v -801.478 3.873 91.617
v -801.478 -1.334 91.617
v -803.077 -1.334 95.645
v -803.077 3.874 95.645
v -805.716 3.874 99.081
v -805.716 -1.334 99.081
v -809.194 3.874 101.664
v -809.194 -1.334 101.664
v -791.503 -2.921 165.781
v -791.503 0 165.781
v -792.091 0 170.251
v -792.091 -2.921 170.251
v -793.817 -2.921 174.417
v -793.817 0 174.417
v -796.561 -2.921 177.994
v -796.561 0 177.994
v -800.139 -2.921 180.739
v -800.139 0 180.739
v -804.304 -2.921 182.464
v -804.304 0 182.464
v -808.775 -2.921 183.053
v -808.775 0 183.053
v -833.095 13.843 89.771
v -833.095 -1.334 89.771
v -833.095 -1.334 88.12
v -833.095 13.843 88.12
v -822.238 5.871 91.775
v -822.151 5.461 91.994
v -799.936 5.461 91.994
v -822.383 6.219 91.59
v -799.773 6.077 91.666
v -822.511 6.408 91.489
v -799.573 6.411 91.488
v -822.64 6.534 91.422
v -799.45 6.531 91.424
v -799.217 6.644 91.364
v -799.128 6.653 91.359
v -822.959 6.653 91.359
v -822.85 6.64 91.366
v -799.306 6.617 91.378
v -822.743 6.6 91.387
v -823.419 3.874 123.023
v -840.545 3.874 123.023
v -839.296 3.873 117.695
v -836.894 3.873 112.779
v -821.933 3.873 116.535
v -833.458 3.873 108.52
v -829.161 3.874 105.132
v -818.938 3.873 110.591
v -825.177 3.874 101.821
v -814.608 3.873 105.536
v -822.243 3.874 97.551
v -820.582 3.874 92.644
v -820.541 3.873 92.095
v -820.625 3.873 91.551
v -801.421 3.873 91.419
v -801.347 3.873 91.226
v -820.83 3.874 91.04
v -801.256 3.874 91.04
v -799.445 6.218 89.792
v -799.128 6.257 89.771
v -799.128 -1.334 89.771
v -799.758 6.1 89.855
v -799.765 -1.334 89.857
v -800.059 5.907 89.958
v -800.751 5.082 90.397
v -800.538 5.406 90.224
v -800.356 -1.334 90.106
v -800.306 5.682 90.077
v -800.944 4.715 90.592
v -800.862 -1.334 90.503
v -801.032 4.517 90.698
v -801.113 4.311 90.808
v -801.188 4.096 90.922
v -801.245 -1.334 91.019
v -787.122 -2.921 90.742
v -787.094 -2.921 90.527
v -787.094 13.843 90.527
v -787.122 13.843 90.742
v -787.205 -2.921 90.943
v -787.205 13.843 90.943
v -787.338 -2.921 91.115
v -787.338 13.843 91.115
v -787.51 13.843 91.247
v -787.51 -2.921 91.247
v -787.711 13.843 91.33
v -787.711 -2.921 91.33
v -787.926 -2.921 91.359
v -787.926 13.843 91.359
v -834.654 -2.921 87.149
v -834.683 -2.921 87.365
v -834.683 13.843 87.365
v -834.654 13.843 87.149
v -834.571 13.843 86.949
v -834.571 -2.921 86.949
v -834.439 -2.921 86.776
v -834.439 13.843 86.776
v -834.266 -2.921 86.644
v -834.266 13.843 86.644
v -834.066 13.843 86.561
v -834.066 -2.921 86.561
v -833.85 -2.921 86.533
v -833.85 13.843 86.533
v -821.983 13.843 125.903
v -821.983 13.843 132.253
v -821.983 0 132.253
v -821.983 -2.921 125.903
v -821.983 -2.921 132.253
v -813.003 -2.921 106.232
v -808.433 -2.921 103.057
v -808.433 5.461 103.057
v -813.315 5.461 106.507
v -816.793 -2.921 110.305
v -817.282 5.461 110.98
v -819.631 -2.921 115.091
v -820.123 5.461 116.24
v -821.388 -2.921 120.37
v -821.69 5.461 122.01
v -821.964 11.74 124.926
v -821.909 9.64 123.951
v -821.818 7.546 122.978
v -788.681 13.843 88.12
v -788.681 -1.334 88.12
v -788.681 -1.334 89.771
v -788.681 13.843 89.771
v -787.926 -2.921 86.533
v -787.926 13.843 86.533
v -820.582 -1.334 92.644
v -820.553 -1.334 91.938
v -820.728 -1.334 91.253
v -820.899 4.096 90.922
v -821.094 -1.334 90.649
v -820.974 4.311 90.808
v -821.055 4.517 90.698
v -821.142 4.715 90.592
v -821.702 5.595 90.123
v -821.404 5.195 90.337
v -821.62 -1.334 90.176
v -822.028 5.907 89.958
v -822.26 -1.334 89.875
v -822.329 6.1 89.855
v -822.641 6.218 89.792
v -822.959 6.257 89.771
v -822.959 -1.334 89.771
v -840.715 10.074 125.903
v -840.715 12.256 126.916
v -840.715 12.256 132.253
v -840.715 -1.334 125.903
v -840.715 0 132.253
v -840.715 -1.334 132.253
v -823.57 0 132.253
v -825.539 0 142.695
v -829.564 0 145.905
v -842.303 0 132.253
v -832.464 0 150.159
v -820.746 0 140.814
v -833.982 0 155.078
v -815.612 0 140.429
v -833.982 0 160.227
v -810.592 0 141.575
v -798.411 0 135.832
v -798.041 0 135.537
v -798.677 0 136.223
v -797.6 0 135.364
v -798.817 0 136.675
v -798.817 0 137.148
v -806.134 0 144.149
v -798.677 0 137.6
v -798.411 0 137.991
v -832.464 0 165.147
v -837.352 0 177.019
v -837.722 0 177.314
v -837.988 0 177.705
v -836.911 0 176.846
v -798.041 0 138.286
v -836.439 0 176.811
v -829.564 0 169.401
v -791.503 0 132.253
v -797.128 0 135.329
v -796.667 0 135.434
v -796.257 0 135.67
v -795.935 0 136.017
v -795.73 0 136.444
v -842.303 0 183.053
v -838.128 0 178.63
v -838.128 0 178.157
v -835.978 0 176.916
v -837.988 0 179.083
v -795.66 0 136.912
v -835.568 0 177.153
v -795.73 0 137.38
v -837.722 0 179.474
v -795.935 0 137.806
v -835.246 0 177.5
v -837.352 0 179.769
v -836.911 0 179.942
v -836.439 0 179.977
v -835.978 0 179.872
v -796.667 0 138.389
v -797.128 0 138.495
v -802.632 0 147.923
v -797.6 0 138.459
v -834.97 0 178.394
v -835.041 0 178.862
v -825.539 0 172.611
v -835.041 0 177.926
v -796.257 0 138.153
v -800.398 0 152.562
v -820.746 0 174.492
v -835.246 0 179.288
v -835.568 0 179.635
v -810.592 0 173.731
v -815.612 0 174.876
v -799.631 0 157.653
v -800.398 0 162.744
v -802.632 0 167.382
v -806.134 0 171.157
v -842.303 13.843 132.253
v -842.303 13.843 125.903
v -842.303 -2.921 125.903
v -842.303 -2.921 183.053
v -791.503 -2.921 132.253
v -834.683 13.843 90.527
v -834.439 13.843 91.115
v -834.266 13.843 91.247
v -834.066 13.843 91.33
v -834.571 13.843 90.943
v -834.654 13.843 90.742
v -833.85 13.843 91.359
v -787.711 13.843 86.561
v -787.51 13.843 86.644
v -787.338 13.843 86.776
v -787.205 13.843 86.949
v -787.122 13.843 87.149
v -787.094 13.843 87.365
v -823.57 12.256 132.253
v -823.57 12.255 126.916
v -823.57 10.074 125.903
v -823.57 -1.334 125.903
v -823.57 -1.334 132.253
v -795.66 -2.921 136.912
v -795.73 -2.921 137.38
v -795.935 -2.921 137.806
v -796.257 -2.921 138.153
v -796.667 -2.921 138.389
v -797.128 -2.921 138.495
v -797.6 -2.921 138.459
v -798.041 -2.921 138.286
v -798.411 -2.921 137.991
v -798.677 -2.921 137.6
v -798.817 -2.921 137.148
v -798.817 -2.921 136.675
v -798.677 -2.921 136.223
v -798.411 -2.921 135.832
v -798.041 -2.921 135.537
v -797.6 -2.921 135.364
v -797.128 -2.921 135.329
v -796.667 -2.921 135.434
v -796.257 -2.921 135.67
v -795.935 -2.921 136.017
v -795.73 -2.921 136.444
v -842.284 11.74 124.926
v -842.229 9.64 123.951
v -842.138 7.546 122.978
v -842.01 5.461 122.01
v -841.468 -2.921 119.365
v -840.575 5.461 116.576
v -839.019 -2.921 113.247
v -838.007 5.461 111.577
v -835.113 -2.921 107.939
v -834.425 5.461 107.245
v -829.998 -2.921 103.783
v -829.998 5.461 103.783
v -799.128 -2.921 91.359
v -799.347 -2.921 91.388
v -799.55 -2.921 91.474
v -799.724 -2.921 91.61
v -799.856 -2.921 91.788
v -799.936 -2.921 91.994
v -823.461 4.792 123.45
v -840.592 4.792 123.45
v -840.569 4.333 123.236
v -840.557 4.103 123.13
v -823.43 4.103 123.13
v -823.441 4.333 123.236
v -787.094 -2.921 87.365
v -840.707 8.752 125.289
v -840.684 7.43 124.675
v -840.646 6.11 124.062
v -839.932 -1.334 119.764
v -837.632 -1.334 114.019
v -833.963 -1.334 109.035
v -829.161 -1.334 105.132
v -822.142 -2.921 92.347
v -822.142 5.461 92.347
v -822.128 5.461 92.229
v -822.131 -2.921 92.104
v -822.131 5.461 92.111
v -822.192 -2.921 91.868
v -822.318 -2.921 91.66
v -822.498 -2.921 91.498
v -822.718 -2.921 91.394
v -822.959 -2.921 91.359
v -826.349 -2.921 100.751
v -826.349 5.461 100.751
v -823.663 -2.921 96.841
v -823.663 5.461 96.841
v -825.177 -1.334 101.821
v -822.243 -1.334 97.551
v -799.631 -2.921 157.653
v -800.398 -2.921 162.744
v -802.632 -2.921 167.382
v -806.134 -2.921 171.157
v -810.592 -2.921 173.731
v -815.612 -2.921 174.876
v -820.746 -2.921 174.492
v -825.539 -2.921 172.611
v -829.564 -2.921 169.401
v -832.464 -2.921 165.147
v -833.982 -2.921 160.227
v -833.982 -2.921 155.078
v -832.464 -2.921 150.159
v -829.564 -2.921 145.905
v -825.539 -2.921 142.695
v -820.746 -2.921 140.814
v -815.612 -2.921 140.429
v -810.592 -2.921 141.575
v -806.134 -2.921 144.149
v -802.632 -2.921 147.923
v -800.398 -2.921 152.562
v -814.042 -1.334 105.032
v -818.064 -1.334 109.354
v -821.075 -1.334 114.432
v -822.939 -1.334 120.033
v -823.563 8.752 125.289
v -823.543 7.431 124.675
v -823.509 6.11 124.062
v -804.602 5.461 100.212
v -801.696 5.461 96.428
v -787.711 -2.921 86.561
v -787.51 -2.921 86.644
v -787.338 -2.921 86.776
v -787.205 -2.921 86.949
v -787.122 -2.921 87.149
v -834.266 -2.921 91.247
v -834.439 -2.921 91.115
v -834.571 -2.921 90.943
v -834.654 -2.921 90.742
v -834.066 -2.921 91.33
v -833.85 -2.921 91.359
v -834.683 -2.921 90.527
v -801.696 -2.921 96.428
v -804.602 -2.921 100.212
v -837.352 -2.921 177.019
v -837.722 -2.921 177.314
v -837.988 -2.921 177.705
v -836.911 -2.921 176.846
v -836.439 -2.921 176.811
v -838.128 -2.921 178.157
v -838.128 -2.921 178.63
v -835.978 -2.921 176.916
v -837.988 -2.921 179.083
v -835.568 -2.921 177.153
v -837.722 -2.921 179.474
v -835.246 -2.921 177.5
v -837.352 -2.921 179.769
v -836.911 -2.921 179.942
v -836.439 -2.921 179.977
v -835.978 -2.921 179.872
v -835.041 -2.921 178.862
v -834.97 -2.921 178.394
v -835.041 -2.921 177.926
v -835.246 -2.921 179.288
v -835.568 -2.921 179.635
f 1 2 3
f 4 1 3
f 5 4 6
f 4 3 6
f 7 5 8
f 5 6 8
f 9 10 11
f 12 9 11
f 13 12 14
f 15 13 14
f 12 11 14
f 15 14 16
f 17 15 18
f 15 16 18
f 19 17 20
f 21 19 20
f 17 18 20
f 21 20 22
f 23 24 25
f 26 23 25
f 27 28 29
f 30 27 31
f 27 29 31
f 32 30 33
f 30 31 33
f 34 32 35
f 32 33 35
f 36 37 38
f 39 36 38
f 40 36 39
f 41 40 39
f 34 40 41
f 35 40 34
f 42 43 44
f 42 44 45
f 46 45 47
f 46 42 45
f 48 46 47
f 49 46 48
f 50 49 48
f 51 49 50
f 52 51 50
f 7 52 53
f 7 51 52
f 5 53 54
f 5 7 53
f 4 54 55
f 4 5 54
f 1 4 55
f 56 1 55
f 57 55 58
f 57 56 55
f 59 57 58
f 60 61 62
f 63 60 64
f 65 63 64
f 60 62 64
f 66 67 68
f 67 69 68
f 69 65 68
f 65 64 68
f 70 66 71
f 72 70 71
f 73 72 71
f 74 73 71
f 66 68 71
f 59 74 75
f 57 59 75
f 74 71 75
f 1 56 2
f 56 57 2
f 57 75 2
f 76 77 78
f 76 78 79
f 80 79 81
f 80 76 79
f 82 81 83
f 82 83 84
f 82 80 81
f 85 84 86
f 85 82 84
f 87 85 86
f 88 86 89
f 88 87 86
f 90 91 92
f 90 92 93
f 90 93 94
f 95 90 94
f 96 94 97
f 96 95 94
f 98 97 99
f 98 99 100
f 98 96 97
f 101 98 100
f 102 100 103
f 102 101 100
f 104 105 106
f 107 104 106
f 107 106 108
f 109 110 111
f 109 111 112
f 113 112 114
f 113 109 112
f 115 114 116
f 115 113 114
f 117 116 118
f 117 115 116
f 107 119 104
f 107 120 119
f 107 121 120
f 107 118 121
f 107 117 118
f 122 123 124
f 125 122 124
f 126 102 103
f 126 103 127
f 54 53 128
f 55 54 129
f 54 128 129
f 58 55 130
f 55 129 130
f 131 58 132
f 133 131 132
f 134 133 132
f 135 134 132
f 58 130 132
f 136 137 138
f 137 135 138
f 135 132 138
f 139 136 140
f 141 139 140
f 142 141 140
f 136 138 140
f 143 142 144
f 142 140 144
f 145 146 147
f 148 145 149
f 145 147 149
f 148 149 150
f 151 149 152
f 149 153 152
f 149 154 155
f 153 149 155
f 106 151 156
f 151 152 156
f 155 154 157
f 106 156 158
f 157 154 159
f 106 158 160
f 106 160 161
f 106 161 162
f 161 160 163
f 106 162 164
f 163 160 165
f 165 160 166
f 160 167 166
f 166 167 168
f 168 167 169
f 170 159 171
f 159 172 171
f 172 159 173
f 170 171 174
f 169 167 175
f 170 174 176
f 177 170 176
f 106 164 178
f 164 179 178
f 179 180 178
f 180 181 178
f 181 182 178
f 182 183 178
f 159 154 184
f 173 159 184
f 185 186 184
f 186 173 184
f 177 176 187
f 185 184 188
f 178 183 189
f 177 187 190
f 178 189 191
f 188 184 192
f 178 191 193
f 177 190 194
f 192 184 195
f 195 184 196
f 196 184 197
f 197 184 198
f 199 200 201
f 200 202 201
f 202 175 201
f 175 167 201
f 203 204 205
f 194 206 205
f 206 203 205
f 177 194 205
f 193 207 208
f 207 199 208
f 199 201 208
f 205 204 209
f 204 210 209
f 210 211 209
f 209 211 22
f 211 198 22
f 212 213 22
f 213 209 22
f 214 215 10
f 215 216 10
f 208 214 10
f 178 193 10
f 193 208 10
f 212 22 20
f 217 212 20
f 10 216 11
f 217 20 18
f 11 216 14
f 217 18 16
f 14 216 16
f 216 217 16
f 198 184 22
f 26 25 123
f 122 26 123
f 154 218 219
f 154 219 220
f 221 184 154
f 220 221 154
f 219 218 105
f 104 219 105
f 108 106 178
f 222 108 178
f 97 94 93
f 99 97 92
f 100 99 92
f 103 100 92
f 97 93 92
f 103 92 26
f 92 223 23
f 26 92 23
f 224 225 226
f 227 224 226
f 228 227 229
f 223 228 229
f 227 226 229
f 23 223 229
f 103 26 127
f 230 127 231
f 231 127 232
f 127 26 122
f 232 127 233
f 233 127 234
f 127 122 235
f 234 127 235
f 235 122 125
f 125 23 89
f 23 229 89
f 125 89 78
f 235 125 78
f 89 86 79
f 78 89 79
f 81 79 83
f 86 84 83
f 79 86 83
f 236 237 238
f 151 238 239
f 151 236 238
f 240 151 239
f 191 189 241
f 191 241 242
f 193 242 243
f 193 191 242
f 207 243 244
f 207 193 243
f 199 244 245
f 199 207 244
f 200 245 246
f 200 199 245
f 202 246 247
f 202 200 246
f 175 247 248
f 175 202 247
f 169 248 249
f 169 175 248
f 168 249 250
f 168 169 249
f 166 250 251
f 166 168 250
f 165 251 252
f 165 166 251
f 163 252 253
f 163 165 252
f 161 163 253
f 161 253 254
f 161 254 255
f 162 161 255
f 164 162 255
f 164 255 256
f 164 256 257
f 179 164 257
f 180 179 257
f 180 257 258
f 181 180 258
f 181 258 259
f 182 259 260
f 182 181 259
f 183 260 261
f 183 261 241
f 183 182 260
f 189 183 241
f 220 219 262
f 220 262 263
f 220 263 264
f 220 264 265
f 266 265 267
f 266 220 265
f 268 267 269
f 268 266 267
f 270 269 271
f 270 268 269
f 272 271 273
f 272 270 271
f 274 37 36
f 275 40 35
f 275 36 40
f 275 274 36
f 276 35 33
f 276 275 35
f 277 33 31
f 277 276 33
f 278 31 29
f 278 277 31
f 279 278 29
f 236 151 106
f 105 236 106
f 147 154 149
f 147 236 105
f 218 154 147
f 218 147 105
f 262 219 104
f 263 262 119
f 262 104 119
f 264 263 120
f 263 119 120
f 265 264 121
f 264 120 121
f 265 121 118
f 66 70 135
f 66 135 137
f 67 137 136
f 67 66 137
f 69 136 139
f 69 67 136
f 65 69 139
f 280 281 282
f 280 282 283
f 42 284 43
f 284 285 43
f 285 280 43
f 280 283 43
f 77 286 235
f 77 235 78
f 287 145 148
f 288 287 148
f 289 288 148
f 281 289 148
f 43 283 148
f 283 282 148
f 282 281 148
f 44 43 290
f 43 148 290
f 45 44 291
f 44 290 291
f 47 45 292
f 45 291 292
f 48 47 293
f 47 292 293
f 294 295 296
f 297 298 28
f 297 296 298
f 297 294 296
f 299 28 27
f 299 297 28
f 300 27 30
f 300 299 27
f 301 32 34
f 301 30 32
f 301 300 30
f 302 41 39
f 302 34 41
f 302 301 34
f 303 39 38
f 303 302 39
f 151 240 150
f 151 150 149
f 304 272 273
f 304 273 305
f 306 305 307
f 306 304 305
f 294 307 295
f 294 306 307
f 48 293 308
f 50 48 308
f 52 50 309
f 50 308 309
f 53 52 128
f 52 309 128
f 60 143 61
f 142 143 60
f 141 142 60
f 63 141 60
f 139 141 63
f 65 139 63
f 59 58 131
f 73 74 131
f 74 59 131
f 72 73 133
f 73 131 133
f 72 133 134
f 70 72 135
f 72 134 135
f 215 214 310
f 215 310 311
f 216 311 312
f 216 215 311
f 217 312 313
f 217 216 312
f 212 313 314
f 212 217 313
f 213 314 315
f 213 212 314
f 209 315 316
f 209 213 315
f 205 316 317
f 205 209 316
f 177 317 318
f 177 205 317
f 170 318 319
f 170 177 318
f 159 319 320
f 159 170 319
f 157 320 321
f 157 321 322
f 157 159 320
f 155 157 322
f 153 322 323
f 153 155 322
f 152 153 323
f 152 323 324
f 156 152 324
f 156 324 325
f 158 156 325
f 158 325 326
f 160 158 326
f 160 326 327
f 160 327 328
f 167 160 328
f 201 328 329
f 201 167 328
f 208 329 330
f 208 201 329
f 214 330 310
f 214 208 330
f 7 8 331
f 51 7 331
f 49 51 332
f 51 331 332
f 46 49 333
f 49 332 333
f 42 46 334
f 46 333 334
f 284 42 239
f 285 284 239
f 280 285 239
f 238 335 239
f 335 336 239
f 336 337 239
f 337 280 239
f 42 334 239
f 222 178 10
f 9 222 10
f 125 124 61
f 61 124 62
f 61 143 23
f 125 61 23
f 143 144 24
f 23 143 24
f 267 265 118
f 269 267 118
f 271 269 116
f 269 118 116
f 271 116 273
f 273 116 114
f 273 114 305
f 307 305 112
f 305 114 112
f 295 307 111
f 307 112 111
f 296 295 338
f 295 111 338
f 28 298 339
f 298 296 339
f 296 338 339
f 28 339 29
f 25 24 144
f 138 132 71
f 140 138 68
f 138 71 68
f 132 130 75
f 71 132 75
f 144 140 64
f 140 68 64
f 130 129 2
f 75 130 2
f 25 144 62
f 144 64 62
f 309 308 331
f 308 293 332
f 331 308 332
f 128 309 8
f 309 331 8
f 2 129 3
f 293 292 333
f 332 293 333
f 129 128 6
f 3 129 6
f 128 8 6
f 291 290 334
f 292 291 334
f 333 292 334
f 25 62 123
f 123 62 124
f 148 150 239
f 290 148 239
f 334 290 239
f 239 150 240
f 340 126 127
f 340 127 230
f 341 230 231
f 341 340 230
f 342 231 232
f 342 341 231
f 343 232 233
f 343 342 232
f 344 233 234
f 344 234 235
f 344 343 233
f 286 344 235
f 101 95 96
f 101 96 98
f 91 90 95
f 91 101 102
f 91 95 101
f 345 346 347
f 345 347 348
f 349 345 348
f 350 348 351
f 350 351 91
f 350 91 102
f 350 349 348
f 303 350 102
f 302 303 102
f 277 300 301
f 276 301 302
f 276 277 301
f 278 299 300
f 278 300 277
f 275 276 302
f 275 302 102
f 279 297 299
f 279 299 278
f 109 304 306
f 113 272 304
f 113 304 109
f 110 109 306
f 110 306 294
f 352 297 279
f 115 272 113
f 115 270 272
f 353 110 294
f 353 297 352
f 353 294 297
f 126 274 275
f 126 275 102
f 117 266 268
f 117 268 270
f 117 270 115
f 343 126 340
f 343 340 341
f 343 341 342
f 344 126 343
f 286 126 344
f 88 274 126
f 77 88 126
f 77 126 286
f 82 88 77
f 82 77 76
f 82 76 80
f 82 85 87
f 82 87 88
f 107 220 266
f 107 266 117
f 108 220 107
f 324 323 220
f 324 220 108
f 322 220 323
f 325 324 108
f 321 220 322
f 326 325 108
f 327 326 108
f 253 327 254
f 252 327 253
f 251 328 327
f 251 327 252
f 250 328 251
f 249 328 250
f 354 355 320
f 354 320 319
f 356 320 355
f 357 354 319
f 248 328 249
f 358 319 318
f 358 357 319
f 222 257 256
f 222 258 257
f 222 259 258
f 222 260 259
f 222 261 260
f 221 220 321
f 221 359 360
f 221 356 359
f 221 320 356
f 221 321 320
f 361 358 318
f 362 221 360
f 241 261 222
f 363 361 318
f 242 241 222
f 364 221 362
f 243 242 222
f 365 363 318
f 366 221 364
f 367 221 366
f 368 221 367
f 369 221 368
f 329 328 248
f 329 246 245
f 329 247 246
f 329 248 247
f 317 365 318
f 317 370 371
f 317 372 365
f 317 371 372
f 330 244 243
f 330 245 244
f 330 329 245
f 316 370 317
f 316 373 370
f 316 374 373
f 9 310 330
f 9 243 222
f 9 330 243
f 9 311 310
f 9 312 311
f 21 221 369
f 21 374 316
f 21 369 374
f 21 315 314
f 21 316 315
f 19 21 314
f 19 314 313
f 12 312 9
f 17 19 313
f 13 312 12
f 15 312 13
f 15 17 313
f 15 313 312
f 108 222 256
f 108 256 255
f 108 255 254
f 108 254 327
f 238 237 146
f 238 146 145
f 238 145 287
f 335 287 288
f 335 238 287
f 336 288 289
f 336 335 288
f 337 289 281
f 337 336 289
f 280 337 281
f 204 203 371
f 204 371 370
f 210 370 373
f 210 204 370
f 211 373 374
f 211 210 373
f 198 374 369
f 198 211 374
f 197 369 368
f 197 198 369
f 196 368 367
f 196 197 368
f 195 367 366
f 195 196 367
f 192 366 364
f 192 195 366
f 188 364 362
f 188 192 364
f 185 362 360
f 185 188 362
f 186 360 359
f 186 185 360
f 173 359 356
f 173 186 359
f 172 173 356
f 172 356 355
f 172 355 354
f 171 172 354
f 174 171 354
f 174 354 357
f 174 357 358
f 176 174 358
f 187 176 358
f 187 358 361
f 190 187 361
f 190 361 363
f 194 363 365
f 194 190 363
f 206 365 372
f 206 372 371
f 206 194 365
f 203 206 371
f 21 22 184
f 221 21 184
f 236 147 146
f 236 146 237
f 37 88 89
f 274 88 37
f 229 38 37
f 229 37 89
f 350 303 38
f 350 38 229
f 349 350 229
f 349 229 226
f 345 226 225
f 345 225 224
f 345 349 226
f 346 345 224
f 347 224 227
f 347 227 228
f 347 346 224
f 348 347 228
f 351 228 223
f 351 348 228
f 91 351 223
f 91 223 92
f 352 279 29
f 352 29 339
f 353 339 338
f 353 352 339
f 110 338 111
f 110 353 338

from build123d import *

# Parameters (mm, degrees)
F0_R        = 1.5875
F0_R_2      = 17.272
F1_DEPTH    = 2.921
F3_DEPTH    = 20.32
F5_DEPTH    = 16.764
F7_DEPTH    = 55.2085729102
F8_T        = 1.5875
F8_T3_DEPTH = 6.096
F8_T5_DEPTH = 23.495
F8_T7_DEPTH = 25.3893680424
F8_T9_DEPTH = 27.0060511967


# Not quite as in the source:
# - a shell that OpenCascade refuses in one call is made with other operations: the cavity is built on its own and cut out


with BuildPart() as f1:
    # F0 (on Front) → F1 (new body)
    with BuildSketch(Plane.XZ):
        with BuildLine():
            Line((-808.7745012016, 183.0527484417), (-842.3025012016, 183.0527484417))
            Line((-842.3025012016, 183.0527484417), (-842.3025012016, 132.2527484417))
            Line((-842.3025012016, 132.2527484417), (-791.5025012016, 132.2527484417))
            Line((-791.5025012016, 132.2527484417), (-791.5025012016, 165.7807484417))
            ThreePointArc((-791.5025012016, 165.7807484417), (-796.561352877, 177.9938967664), (-808.7745012016, 183.0527484417))
        make_face()
        with Locations((-797.2470434503, 136.9116393686)):
            Circle(F0_R, mode=Mode.SUBTRACT)
        with Locations((-816.9025012016, 157.6527484417)):
            Circle(F0_R_2, mode=Mode.SUBTRACT)
        with Locations((-836.557958953, 178.3938575148)):
            Circle(F0_R, mode=Mode.SUBTRACT)
    extrude(amount=F1_DEPTH)

    # F2 (on face) → F3 (join)
    with BuildSketch(Plane(origin=(-842.3025012016, 0, 0), x_dir=(0, -1, 0), z_dir=(-1, 0, 0))):
        Polygon((2.921, 125.9027484417), (2.921, 132.2527484417), (0, 132.2527484417), (-13.843, 132.2527484417), (-13.843, 125.9027484417), align=None)
    extrude(amount=-F3_DEPTH)

    # F4 (on face) → F5 (join, through all)
    with BuildSketch(Plane.XZ.offset(2.921)):
        with BuildLine():
            Line((-821.9825012016, 125.9027484417), (-842.3025012016, 125.9027484417))
            ThreePointArc((-842.3025012016, 125.9027484417), (-839.0194061041, 113.2468388218), (-829.9981379746, 103.782828939))
            ThreePointArc((-829.9981379746, 103.782828939), (-824.8710634373, 98.8883942721), (-822.1415983833, 92.3468039044))
            ThreePointArc((-822.1415983833, 92.3468039044), (-822.3177482435, 91.6604679901), (-822.9588808932, 91.3587484417))
            Line((-822.9588808932, 91.3587484417), (-833.8504607139, 91.3587484417))
            ThreePointArc((-833.8504607139, 91.3587484417), (-834.438802185, 91.115049425), (-834.6825012016, 90.5267079539))
            Line((-834.6825012016, 90.5267079539), (-834.6825012016, 87.3647889295))
            ThreePointArc((-834.6825012016, 87.3647889295), (-834.438802185, 86.7764474583), (-833.8504607139, 86.5327484417))
            Line((-833.8504607139, 86.5327484417), (-787.9259687792, 86.5327484417))
            ThreePointArc((-787.9259687792, 86.5327484417), (-787.337627308, 86.7764474583), (-787.0939282914, 87.3647889295))
            Line((-787.0939282914, 87.3647889295), (-787.0939282914, 90.5267079539))
            ThreePointArc((-787.0939282914, 90.5267079539), (-787.337627308, 91.115049425), (-787.9259687792, 91.3587484417))
            Line((-787.9259687792, 91.3587484417), (-799.1278296965, 91.3587484417))
            ThreePointArc((-799.1278296965, 91.3587484417), (-799.6417555246, 91.5364406915), (-799.9361712736, 91.9936208083))
            ThreePointArc((-799.9361712736, 91.9936208083), (-803.0180469013, 98.4212453171), (-808.4330915744, 103.0569335505))
            ThreePointArc((-808.4330915744, 103.0569335505), (-818.3403970657, 112.6219563033), (-821.9825012016, 125.9027484417))
        make_face()
    extrude(amount=-F5_DEPTH)

    # F6 (on face) → F7 (cut, through all)
    with BuildSketch(Plane.YZ.offset(-787.0939282914)):
        Polygon((13.843, 91.3587484417), (13.843, 125.9027484417), (5.461, 122.0099536731), (5.461, 91.9936208083), (6.6532706411, 91.3587484417), align=None)
    extrude(amount=-F7_DEPTH, mode=Mode.SUBTRACT)

    # F8: shell of thickness 1.5875, made by hand


with BuildPart() as f8_core1:
    # F8_t2: copy of F1
    add(f1.part)

    # the walls: a layer under each face that stays
    f8_faces = [f8_core1.faces().sort_by_distance(p)[0] for p in [
        (-825.5385012016, -1.4605, 183.0527484417),
        (-814.6982147465, -2.921, 134.7927484417),
        (-838.145458953, -1.4605, 178.3938575148),
        (-834.1745012016, -1.4605, 157.6527484417),
        (-798.8345434503, -1.4605, 136.9116393686),
        (-791.5025012016, -1.4605, 149.0167484417),
        (-806.7425012016, -1.4605, 132.2527484417),
        (-821.9825012016, 5.461, 129.0777484417),
        (-832.1425012016, 13.843, 129.0777484417),
        (-831.9961644541, 9.652, 123.9563510574),
        (-820.9729994901, 5.461, 107.0017872407),
        (-811.0433552949, 6.0571353205, 91.676184625),
        (-812.2898246487, -0.127, 105.6357879061),
        (-803.0180469013, 1.27, 98.4212453171),
        (-799.6417555246, 1.8661353205, 91.5364406915),
        (-787.0939282914, 5.461, 88.9457484417),
        (-810.8882147465, 5.461, 86.5327484417),
        (-834.6825012016, 5.461, 88.9457484417),
        (-795.5800507683, 11.049, 91.3587484417),
        (-822.3177482435, 1.8661353205, 91.6604679901),
        (-824.8710634373, 1.27, 98.8883942721),
        (-841.9306657608, -0.127, 121.5183203365),
        (-833.835834535, 0, 140.7194151084),
        (-842.3025012016, -0.127, 173.5277484417),
        (-796.561352877, -1.4605, 177.9938967664),
    ]]
    thicken(f8_faces, amount=-F8_T, mode=Mode.SUBTRACT)

    # F8_s4 → F8_t3 (cut)
    with BuildSketch(Plane.XZ.offset(-1.5875)):
        Polygon((-821.9666262016, 132.2368734417), (-821.9825012016, 133.8402484417), (-823.5700012016, 133.8402484417), (-823.5700012016, 132.2527484417), align=None)
    extrude(amount=F8_T3_DEPTH, mode=Mode.SUBTRACT)

    # F8_s6 → F8_t5 (cut)
    with BuildSketch(Plane.YZ.offset(-843.5973277066)):
        Polygon((5.4835617697, 121.9955556616), (4.7923230267, 123.4497548244), (3.8735, 123.0230321483), (3.8735, 122.0099536731), align=None)
    extrude(amount=F8_T5_DEPTH, mode=Mode.SUBTRACT)

    # F8_s8 → F8_t7 (cut)
    with BuildSketch(Plane.YZ.offset(-823.7380393161)):
        Polygon((5.4843363881, 92.0076330641), (3.8735, 91.9936208083), (3.8735, 91.0404117704), (4.7148611881, 90.5923952293), align=None)
    extrude(amount=F8_T7_DEPTH, mode=Mode.SUBTRACT)

    # F8_s10 → F8_t9 (cut)
    with BuildSketch(Plane.YZ.offset(-824.5463808932)):
        Polygon((6.6607320292, 91.3886356975), (5.9071318292, 89.9575228626), (6.2569494224, 89.7712484417), (6.6532706411, 89.7712484417), align=None)
    extrude(amount=F8_T9_DEPTH, mode=Mode.SUBTRACT)


with BuildPart() as f1_1:
    add(f1.part)

    # what is left inside the walls is the cavity
    f8_cavity = [f8_core1.part.solids().sort_by_distance(p)[0] for p in [
        (-814.698215, -1.317625, 102.831082),
    ]]
    add(f8_cavity, mode=Mode.SUBTRACT)


solid = f1_1.part
